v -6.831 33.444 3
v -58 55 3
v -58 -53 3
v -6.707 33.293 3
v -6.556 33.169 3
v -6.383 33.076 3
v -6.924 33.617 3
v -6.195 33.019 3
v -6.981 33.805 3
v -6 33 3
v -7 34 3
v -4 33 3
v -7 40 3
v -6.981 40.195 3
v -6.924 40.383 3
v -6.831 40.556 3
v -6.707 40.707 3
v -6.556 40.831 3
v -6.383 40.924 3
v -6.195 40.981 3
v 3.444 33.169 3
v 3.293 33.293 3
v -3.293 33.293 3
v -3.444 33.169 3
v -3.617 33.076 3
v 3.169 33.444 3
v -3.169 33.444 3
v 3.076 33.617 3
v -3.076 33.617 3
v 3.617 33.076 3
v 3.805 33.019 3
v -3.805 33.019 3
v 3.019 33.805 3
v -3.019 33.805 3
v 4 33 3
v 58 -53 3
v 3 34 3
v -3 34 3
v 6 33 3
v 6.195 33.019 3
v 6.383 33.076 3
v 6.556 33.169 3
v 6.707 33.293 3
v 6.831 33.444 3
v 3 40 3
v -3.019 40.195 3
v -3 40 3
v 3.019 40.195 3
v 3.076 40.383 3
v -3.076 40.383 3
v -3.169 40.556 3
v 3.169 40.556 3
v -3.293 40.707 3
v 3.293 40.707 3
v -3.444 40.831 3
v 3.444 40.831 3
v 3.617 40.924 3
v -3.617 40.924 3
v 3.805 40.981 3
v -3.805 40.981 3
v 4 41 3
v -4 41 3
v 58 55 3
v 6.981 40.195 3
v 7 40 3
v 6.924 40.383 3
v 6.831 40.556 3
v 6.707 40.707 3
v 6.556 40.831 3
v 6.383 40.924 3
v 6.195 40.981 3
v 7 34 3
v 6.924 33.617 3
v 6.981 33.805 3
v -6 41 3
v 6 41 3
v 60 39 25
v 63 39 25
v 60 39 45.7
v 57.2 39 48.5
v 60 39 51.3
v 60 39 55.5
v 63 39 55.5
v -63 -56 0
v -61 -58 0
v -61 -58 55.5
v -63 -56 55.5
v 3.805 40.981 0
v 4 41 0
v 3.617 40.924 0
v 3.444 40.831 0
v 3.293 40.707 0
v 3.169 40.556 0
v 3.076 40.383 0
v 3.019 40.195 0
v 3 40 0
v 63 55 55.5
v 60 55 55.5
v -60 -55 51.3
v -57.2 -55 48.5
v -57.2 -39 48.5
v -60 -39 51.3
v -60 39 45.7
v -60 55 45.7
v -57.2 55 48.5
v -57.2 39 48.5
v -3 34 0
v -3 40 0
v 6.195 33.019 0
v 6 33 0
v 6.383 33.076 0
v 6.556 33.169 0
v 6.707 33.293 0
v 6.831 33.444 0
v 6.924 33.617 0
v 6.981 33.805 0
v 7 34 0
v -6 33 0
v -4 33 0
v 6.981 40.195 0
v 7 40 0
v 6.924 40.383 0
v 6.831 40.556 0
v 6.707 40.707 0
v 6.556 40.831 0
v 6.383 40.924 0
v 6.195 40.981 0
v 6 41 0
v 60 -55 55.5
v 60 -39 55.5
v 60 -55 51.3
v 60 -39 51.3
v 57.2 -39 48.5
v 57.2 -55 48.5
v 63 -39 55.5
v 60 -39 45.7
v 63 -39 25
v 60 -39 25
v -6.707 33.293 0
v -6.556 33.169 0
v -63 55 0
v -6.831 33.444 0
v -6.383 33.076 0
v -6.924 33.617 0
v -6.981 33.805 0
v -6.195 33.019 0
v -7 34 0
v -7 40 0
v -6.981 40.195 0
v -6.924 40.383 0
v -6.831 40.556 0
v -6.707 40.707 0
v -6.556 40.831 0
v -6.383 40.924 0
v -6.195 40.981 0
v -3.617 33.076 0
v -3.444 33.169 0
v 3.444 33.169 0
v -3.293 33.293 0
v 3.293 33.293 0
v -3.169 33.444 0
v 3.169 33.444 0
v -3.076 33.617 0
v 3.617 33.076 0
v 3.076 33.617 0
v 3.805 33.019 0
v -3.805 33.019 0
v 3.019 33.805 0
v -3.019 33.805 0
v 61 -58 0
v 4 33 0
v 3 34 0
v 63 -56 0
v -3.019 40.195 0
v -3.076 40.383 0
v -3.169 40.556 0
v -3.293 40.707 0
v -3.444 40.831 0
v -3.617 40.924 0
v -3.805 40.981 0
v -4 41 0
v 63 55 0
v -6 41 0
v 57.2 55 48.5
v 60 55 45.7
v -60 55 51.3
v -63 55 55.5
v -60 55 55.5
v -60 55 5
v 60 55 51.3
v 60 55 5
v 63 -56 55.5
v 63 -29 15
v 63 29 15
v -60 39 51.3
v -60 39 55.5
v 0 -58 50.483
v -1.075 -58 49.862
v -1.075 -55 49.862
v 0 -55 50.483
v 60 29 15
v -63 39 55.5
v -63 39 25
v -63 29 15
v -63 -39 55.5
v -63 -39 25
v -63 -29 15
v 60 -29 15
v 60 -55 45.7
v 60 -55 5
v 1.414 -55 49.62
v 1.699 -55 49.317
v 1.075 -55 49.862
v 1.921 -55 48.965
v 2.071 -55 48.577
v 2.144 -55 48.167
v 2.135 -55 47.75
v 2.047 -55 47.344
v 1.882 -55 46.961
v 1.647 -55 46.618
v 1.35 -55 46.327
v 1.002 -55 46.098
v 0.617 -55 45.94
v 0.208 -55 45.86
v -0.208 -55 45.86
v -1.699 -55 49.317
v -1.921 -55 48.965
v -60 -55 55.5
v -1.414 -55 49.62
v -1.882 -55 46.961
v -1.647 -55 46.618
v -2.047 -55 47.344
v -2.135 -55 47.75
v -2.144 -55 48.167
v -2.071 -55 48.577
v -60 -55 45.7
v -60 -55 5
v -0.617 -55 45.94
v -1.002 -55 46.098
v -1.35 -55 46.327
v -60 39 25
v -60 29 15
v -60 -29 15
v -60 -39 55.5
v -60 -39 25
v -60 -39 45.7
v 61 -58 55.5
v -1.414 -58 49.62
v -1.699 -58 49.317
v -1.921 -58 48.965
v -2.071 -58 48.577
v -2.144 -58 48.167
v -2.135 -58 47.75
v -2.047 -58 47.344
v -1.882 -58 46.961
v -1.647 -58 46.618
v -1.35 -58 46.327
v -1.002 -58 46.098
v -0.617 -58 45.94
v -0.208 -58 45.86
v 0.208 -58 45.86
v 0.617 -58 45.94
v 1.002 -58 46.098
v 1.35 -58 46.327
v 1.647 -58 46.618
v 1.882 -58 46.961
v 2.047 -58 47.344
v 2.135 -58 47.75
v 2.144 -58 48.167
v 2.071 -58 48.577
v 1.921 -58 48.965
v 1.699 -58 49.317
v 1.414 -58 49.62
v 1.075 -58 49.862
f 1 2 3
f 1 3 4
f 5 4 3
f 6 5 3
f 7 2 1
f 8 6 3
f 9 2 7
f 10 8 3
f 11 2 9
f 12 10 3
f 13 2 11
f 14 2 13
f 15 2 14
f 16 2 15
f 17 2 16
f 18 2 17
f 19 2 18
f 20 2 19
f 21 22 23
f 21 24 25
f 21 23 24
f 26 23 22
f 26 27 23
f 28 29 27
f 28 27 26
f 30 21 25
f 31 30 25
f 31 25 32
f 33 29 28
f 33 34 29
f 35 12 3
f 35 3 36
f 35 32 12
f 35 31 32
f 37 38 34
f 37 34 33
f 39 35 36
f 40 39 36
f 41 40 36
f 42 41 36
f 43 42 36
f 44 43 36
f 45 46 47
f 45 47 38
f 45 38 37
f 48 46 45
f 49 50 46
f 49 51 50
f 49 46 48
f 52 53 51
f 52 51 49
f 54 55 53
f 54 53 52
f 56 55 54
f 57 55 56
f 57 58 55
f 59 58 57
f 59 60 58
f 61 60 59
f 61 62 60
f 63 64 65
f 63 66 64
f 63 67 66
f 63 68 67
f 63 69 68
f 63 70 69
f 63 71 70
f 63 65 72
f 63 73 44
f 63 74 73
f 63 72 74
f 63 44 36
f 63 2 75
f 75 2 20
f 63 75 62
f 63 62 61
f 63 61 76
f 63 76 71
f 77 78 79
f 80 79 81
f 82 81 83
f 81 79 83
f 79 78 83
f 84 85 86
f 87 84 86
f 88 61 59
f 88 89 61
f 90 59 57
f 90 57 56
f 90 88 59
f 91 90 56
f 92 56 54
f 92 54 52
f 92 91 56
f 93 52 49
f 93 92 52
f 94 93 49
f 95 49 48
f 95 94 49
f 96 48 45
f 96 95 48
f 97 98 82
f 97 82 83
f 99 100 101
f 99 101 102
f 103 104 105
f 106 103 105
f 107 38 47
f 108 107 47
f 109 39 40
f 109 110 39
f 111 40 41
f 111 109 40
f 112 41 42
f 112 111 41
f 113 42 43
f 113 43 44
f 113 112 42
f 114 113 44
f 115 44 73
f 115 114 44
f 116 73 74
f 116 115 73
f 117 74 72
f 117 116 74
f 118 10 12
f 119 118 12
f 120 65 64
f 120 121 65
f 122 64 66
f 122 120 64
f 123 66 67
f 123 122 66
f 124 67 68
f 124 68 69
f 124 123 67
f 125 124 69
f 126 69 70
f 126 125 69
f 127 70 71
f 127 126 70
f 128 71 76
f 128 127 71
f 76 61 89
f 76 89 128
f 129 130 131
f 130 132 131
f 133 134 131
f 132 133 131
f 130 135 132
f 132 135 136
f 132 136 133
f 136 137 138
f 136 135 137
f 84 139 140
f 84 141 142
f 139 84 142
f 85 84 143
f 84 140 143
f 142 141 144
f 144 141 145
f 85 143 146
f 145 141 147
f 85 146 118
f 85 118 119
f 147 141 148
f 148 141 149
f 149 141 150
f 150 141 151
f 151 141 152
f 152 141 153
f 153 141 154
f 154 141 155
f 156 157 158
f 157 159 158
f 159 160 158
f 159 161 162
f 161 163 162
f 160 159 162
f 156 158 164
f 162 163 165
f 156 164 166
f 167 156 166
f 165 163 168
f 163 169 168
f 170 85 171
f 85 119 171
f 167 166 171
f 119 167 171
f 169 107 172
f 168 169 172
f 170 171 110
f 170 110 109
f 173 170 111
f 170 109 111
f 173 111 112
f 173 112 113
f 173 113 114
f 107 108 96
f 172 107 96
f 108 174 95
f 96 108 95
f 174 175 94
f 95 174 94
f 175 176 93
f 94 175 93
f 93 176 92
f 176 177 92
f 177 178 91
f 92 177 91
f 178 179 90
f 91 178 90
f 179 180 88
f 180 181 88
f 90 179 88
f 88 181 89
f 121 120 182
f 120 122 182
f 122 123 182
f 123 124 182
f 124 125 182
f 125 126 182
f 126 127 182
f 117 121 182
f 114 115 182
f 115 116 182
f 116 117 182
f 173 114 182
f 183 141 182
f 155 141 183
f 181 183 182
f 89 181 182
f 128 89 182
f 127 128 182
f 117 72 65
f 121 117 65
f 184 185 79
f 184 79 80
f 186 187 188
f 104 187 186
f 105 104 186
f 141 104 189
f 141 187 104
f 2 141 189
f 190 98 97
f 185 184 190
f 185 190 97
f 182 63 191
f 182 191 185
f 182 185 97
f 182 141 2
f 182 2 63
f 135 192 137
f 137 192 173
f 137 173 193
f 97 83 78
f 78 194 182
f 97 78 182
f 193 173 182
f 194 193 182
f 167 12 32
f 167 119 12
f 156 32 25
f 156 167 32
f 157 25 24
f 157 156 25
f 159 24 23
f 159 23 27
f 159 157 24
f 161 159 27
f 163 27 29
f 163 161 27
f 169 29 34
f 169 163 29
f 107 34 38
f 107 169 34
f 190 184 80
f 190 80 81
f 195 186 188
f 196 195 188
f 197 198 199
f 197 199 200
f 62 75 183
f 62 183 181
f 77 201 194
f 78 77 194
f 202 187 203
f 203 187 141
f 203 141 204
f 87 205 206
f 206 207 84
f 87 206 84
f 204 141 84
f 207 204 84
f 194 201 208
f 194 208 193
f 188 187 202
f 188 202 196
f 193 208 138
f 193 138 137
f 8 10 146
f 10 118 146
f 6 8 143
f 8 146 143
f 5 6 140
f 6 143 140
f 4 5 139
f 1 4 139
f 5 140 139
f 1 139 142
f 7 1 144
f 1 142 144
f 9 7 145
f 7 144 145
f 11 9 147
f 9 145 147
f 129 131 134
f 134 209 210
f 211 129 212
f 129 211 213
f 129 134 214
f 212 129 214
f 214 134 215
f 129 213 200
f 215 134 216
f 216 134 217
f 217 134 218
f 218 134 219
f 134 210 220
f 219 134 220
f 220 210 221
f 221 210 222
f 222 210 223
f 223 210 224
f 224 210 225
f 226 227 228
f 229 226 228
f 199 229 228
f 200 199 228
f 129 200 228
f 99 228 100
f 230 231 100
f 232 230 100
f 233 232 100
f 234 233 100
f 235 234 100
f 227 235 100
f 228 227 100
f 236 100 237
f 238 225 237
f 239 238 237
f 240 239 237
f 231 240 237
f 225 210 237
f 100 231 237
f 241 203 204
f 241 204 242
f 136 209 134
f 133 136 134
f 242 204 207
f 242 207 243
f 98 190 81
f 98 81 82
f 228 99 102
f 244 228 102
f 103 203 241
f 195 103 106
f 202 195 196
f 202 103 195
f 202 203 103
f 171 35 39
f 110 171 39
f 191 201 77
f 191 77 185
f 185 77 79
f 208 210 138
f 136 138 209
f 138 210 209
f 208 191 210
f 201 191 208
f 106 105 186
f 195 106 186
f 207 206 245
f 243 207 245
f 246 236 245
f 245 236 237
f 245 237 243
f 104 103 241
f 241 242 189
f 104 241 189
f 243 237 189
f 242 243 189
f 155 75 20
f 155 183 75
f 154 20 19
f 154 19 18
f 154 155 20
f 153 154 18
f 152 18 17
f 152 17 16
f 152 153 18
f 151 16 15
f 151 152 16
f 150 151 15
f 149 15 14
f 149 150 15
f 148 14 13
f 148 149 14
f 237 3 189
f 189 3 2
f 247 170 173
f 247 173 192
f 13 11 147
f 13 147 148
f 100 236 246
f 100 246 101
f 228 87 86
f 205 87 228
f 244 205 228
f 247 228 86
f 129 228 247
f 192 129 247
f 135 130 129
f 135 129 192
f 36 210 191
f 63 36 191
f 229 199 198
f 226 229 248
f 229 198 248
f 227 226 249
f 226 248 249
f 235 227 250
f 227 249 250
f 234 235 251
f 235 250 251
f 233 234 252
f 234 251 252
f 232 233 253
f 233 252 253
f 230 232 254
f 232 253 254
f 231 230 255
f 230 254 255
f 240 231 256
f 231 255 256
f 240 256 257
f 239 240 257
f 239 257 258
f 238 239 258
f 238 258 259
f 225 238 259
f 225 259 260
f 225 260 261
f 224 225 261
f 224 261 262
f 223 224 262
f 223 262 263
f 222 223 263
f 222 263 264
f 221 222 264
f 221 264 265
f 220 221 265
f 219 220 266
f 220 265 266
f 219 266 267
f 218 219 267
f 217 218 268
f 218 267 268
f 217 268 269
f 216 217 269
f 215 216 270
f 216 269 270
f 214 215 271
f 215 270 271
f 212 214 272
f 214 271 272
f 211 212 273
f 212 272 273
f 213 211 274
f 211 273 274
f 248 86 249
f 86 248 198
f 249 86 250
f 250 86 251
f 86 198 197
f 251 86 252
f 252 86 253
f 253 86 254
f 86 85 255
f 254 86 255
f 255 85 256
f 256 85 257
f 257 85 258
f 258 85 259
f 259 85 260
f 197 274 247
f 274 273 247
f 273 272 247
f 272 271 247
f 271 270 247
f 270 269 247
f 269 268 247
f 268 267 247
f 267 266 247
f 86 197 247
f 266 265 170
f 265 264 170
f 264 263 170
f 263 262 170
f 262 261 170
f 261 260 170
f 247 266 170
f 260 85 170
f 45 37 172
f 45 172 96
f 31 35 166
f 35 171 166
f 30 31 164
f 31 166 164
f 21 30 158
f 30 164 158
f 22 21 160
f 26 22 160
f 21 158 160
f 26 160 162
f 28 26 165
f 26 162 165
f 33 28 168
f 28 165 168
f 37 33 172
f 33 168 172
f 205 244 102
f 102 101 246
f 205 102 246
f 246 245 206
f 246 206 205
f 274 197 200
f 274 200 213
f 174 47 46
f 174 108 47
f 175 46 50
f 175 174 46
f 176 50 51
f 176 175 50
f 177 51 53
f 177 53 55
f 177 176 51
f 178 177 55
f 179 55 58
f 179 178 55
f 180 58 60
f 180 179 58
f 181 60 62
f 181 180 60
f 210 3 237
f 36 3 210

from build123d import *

# Parameters (mm, degrees)
SKETCH1_W           = 126
SKETCH1_H           = 110
BOSS_EXTRUDE1_DEPTH = 3
SKETCH2_W           = 50
SKETCH2_H           = 16
BOSS_EXTRUDE2_DEPTH = 3
BOSS_EXTRUDE3_DEPTH = 16
BOSS_EXTRUDE4_DEPTH = 16
SKETCH5_W           = 126
SKETCH5_H           = 53
BOSS_EXTRUDE5_DEPTH = 3
SKETCH7_W           = 3
SKETCH7_H           = 78
BOSS_EXTRUDE6_DEPTH = 12
SKETCH8_R           = 2.15
CUT_EXTRUDE1_DEPTH  = 140.810586151
CUT_EXTRUDE2_DEPTH  = 140.810586151
CUT_EXTRUDE3_DEPTH  = 138.397234324
SKETCH11_W          = 3
SKETCH11_H          = 16
BOSS_EXTRUDE7_DEPTH = 2.5
CHAMFER1_SIZE       = 10
CHAMFER2_SIZE       = 2
SKETCH12_W          = 4
SKETCH12_H          = 8
CUT_EXTRUDE4_DEPTH  = 101.445258723
FILLET1_R           = 1
CHAMFER3_SIZE       = 2


with BuildPart() as part:
    # Sketch1 → Boss-Extrude1 (new body)
    with BuildSketch(Plane.XY):
        Rectangle(SKETCH1_W, SKETCH1_H)
    extrude(amount=BOSS_EXTRUDE1_DEPTH)

    # Sketch2 → Boss-Extrude2 (add)
    with BuildSketch(Plane.ZY.offset(63)):
        with Locations((28, 47)):
            Rectangle(SKETCH2_W, SKETCH2_H)
        with Locations((28, -47)):
            Rectangle(SKETCH2_W, SKETCH2_H)
    boss_extrude2 = extrude(amount=-BOSS_EXTRUDE2_DEPTH)

    # Sketch3 → Boss-Extrude3 (add)
    with BuildSketch(Plane.XZ.offset(55)):
        Polygon((-60, 45.5), (-57, 48.5), (-60, 51.5), align=None)
    boss_extrude3 = extrude(amount=-BOSS_EXTRUDE3_DEPTH)

    # Sketch4 → Boss-Extrude4 (add)
    with BuildSketch(Plane(origin=(0, 55, 0), x_dir=(1, 0, 0), z_dir=(0, 1, 0))):
        Polygon((-60, -51.5), (-57, -48.5), (-60, -45.5), align=None)
    boss_extrude4 = extrude(amount=-BOSS_EXTRUDE4_DEPTH)

    # Mirror1: Boss-Extrude2, Boss-Extrude3, Boss-Extrude4 across plane
    add(boss_extrude2.mirror(Plane(origin=(0, 0, 0), x_dir=(0, 0, 1), z_dir=(1, 0, 0))))
    add(boss_extrude3.mirror(Plane(origin=(0, 0, 0), x_dir=(0, 0, 1), z_dir=(1, 0, 0))))
    add(boss_extrude4.mirror(Plane(origin=(0, 0, 0), x_dir=(0, 0, 1), z_dir=(1, 0, 0))))

    # Sketch5 → Boss-Extrude5 (add)
    with BuildSketch(Plane.XZ.offset(55)):
        with Locations((0, 26.5)):
            Rectangle(SKETCH5_W, SKETCH5_H)
    extrude(amount=BOSS_EXTRUDE5_DEPTH)

    # Sketch7 → Boss-Extrude6 (add)
    with BuildSketch(Plane.XY.offset(3)):
        with Locations((-61.5, 0)):
            Rectangle(SKETCH7_W, SKETCH7_H)
        with Locations((61.5, 0)):
            Rectangle(SKETCH7_W, SKETCH7_H)
    extrude(amount=BOSS_EXTRUDE6_DEPTH)

    # Sketch8 → Cut-Extrude1 (cut, through all)
    with BuildSketch(Plane.XZ.offset(58)):
        with Locations(Location((0, 48, 0), (0, 0, 270))):
            Circle(SKETCH8_R)
    extrude(amount=-CUT_EXTRUDE1_DEPTH, mode=Mode.SUBTRACT)

    # Sketch9 → Cut-Extrude2 (cut, through all)
    with BuildSketch(Plane.XZ.offset(58)):
        Polygon((-1.075, 49.861954618), (0, 50.482606158), (1.075, 49.861954618), align=None)
    extrude(amount=-CUT_EXTRUDE2_DEPTH, mode=Mode.SUBTRACT)

    # Sketch10 → Cut-Extrude3 (cut, through all)
    with BuildSketch(Plane(origin=(0, -55, 0), x_dir=(1, 0, 0), z_dir=(0, 1, 0))):
        Polygon((-60, -45.5), (-60, -45.7), (-57.2, -48.5), (-60, -51.3), (-60, -51.5), (-57, -48.5), align=None)
        Polygon((60, -45.7), (57.2, -48.5), (60, -51.3), (60, -51.5), (57, -48.5), (60, -45.5), align=None)
    extrude(amount=CUT_EXTRUDE3_DEPTH, mode=Mode.SUBTRACT)

    # Sketch11 → Boss-Extrude7 (add)
    with BuildSketch(Plane.XY.offset(53)):
        Polygon((-63, -39), (-63, -58), (63, -58), (63, -39), (60, -39), (60, -55), (-60, -55), (-60, -39), align=None)
        with Locations((-61.5, 47)):
            Rectangle(SKETCH11_W, SKETCH11_H)
        with Locations((61.5, 47)):
            Rectangle(SKETCH11_W, SKETCH11_H)
    extrude(amount=BOSS_EXTRUDE7_DEPTH)

    # Chamfer1
    chamfer1_edges = [part.edges().sort_by_distance(p)[0] for p in [
        (-61.5, -39, 15),
        (-61.5, 39, 15),
        (61.5, 39, 15),
        (61.5, -39, 15),
    ]]
    chamfer(chamfer1_edges, length=CHAMFER1_SIZE)

    # Chamfer2
    chamfer2_edges = [part.edges().sort_by_distance(p)[0] for p in [
        (-60, 0, 3),
        (0, -55, 3),
        (60, 0, 3),
    ]]
    chamfer(chamfer2_edges, length=CHAMFER2_SIZE)

    # Sketch12 → Cut-Extrude4 (cut, through all)
    with BuildSketch(Plane.XY.offset(3)):
        with Locations((-5, 37)):
            Rectangle(SKETCH12_W, SKETCH12_H)
        with Locations((5, 37)):
            Rectangle(SKETCH12_W, SKETCH12_H)
    extrude(amount=-CUT_EXTRUDE4_DEPTH, mode=Mode.SUBTRACT)

    # Fillet1
    fillet1_edges = [part.edges().sort_by_distance(p)[0] for p in [
        (-7, 33, 1.5),
        (-7, 41, 1.5),
        (-3, 41, 1.5),
        (-3, 33, 1.5),
        (3, 33, 1.5),
        (3, 41, 1.5),
        (7, 41, 1.5),
        (7, 33, 1.5),
    ]]
    fillet(fillet1_edges, radius=FILLET1_R)

    # Chamfer3
    chamfer3_edges = [part.edges().sort_by_distance(p)[0] for p in [
        (-63, -58, 27.75),
        (63, -58, 27.75),
    ]]
    chamfer(chamfer3_edges, length=CHAMFER3_SIZE)


solid = part.part
